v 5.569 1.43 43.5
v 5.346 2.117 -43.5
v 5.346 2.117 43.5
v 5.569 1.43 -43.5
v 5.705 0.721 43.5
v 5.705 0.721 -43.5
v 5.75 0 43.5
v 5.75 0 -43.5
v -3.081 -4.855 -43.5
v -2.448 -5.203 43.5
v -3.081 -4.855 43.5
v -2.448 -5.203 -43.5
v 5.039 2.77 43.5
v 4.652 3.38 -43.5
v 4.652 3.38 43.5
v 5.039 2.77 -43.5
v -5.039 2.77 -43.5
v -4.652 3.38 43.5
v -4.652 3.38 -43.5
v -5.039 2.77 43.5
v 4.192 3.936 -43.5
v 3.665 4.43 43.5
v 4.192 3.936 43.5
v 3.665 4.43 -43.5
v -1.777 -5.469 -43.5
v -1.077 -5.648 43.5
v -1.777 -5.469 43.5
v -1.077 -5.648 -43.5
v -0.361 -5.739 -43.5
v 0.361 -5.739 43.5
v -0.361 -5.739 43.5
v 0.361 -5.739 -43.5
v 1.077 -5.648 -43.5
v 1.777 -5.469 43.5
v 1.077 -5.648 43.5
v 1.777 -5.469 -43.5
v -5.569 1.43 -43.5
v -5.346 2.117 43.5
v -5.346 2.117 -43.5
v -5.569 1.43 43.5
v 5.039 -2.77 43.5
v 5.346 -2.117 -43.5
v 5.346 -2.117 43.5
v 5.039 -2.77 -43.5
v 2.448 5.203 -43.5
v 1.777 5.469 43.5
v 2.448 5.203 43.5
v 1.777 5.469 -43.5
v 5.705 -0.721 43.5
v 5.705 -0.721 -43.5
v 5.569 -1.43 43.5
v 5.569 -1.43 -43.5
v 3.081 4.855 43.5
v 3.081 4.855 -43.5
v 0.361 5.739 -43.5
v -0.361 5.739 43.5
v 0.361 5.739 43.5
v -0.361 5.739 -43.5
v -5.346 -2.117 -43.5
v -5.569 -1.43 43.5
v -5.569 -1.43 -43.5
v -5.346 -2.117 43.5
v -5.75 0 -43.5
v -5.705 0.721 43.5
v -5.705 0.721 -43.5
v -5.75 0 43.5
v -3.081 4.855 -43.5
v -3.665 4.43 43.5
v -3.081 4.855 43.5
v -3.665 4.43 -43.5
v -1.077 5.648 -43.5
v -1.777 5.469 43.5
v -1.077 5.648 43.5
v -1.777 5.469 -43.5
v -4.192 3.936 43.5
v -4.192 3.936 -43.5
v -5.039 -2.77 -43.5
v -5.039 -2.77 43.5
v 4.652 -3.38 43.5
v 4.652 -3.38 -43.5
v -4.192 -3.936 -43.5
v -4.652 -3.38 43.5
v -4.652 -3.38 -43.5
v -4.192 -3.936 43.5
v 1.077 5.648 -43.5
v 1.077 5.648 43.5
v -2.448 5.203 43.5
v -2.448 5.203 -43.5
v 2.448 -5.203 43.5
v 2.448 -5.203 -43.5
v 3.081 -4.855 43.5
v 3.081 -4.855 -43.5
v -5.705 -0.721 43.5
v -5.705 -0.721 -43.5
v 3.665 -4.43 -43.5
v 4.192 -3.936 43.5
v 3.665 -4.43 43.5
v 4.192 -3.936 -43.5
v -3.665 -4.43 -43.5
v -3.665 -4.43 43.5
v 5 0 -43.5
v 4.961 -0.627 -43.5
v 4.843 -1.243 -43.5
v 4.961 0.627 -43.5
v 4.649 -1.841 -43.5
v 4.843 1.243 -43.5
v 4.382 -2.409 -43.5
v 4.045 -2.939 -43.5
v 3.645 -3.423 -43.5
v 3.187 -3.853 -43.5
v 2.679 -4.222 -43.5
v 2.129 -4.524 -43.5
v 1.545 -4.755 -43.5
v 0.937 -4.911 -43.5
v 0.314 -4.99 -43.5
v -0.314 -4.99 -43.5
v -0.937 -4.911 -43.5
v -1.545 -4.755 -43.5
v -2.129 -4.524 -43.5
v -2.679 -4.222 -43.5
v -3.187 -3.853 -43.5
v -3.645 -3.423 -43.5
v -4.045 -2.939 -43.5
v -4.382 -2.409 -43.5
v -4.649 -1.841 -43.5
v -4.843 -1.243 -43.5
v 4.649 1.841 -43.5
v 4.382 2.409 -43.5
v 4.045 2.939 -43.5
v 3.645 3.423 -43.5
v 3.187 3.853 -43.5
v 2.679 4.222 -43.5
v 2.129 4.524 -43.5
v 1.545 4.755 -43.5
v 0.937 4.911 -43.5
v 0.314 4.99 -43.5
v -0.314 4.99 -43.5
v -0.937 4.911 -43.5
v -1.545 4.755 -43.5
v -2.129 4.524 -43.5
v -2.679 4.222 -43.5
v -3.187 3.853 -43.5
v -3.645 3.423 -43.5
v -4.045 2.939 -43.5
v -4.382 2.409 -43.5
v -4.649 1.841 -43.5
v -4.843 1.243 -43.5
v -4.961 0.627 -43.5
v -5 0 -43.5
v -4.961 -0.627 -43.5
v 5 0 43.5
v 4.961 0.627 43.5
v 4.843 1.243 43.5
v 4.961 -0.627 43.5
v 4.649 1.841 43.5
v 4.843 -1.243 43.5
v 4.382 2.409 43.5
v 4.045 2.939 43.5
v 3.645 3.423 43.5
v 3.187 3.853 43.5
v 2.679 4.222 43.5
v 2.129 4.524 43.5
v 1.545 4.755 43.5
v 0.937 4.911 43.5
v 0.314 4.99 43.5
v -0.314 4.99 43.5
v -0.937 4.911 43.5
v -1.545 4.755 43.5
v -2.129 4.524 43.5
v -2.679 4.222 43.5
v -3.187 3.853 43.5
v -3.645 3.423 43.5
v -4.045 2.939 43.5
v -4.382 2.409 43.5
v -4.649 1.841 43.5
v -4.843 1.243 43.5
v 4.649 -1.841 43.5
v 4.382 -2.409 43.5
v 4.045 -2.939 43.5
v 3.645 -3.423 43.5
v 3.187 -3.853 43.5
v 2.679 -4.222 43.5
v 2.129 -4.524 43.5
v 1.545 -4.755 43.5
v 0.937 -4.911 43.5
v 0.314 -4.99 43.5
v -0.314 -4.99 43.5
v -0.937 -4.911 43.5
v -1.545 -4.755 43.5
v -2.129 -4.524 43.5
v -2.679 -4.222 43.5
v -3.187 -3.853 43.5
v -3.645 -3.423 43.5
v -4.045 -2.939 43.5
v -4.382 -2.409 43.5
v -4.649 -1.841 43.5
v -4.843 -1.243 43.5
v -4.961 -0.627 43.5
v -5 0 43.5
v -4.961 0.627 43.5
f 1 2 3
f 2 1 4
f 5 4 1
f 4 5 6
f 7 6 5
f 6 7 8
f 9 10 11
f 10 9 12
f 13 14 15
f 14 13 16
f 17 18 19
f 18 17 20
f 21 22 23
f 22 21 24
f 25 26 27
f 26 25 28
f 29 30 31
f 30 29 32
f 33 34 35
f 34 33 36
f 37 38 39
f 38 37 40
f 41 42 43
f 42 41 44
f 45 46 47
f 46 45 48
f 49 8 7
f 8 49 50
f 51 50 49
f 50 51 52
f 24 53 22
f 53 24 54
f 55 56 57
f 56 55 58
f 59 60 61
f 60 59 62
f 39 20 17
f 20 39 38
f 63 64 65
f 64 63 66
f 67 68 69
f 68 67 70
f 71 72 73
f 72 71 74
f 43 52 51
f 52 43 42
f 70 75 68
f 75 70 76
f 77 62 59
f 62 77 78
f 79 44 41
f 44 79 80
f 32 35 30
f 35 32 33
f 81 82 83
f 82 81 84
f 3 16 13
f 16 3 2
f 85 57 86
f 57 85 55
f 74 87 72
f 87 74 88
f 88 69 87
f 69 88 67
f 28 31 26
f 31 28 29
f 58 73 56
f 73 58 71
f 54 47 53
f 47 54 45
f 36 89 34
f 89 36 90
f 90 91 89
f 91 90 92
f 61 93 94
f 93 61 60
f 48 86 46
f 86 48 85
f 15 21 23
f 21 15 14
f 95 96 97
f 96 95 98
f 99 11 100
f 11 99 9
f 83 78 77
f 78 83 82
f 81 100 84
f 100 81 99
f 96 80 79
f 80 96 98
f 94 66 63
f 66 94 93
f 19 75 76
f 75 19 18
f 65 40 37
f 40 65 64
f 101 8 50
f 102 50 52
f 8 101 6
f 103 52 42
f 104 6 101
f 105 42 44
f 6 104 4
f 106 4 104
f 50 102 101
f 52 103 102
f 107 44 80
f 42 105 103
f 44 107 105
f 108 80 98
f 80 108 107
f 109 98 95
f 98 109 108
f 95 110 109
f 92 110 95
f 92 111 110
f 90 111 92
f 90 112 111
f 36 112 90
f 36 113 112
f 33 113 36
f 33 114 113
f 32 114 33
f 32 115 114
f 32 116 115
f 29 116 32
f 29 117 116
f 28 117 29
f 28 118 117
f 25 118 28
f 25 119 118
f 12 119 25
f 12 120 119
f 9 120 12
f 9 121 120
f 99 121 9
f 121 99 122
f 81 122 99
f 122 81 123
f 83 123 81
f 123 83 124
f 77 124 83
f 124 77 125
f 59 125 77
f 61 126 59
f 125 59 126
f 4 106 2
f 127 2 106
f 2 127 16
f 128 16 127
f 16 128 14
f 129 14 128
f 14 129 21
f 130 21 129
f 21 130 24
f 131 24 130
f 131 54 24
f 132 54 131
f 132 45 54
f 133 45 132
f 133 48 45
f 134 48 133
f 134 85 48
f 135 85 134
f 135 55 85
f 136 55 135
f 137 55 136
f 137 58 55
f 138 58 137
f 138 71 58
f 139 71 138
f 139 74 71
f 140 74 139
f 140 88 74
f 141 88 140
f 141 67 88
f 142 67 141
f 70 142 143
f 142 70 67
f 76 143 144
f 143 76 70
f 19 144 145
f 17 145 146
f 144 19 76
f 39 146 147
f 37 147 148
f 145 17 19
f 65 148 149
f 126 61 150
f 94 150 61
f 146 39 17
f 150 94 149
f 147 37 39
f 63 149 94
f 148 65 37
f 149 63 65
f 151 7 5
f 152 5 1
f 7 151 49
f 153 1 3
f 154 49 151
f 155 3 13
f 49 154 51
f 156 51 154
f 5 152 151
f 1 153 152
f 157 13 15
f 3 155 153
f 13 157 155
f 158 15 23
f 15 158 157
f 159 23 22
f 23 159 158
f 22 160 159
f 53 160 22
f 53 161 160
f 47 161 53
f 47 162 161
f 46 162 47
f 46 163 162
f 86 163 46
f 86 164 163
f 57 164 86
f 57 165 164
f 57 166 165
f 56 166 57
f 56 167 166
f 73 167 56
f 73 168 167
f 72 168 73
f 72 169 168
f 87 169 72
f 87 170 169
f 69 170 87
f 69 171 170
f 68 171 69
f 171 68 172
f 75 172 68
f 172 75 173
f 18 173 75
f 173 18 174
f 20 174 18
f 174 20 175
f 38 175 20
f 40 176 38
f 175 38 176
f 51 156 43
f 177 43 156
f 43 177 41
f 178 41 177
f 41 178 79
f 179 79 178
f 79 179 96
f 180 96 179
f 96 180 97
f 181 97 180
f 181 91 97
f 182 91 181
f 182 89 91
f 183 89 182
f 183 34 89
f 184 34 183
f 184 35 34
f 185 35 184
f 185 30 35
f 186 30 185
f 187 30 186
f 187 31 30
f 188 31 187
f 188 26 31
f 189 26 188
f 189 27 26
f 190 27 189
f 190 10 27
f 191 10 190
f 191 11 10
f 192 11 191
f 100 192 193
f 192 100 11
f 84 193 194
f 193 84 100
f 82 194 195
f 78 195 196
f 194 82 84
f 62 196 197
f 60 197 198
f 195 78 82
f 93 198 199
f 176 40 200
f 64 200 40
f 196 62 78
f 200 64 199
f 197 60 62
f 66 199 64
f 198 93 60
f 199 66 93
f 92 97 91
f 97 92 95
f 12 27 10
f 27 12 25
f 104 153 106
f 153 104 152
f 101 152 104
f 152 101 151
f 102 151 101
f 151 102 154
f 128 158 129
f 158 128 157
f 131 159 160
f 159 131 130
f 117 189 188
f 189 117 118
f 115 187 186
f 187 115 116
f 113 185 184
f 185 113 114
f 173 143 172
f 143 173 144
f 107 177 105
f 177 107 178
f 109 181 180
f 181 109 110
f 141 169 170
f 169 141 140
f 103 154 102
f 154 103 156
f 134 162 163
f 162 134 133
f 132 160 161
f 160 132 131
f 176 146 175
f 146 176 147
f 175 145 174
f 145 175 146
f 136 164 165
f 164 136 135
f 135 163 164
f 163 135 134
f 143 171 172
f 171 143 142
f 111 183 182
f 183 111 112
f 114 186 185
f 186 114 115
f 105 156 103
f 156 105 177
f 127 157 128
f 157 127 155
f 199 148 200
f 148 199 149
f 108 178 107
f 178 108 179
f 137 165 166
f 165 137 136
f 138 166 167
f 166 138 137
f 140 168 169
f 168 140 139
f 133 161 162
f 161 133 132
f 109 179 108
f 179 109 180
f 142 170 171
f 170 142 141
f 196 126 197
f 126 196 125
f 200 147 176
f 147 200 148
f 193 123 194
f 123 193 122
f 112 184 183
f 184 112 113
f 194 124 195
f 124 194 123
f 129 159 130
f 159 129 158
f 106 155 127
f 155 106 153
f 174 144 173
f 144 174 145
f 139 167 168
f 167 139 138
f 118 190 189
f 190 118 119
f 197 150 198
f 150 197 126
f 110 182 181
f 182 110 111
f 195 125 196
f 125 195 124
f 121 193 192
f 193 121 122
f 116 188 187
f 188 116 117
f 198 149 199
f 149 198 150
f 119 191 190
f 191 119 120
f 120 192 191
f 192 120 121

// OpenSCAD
$fn = 50;


difference() {
	union() {
		translate(v = [0, 0, -43.5000000000]) {
			cylinder(h = 87, r = 5.7500000000);
		}
	}
	union() {
		translate(v = [0, 0, -100.0000000000]) {
			cylinder(h = 200, r = 5.0000000000);
		}
	}
}
